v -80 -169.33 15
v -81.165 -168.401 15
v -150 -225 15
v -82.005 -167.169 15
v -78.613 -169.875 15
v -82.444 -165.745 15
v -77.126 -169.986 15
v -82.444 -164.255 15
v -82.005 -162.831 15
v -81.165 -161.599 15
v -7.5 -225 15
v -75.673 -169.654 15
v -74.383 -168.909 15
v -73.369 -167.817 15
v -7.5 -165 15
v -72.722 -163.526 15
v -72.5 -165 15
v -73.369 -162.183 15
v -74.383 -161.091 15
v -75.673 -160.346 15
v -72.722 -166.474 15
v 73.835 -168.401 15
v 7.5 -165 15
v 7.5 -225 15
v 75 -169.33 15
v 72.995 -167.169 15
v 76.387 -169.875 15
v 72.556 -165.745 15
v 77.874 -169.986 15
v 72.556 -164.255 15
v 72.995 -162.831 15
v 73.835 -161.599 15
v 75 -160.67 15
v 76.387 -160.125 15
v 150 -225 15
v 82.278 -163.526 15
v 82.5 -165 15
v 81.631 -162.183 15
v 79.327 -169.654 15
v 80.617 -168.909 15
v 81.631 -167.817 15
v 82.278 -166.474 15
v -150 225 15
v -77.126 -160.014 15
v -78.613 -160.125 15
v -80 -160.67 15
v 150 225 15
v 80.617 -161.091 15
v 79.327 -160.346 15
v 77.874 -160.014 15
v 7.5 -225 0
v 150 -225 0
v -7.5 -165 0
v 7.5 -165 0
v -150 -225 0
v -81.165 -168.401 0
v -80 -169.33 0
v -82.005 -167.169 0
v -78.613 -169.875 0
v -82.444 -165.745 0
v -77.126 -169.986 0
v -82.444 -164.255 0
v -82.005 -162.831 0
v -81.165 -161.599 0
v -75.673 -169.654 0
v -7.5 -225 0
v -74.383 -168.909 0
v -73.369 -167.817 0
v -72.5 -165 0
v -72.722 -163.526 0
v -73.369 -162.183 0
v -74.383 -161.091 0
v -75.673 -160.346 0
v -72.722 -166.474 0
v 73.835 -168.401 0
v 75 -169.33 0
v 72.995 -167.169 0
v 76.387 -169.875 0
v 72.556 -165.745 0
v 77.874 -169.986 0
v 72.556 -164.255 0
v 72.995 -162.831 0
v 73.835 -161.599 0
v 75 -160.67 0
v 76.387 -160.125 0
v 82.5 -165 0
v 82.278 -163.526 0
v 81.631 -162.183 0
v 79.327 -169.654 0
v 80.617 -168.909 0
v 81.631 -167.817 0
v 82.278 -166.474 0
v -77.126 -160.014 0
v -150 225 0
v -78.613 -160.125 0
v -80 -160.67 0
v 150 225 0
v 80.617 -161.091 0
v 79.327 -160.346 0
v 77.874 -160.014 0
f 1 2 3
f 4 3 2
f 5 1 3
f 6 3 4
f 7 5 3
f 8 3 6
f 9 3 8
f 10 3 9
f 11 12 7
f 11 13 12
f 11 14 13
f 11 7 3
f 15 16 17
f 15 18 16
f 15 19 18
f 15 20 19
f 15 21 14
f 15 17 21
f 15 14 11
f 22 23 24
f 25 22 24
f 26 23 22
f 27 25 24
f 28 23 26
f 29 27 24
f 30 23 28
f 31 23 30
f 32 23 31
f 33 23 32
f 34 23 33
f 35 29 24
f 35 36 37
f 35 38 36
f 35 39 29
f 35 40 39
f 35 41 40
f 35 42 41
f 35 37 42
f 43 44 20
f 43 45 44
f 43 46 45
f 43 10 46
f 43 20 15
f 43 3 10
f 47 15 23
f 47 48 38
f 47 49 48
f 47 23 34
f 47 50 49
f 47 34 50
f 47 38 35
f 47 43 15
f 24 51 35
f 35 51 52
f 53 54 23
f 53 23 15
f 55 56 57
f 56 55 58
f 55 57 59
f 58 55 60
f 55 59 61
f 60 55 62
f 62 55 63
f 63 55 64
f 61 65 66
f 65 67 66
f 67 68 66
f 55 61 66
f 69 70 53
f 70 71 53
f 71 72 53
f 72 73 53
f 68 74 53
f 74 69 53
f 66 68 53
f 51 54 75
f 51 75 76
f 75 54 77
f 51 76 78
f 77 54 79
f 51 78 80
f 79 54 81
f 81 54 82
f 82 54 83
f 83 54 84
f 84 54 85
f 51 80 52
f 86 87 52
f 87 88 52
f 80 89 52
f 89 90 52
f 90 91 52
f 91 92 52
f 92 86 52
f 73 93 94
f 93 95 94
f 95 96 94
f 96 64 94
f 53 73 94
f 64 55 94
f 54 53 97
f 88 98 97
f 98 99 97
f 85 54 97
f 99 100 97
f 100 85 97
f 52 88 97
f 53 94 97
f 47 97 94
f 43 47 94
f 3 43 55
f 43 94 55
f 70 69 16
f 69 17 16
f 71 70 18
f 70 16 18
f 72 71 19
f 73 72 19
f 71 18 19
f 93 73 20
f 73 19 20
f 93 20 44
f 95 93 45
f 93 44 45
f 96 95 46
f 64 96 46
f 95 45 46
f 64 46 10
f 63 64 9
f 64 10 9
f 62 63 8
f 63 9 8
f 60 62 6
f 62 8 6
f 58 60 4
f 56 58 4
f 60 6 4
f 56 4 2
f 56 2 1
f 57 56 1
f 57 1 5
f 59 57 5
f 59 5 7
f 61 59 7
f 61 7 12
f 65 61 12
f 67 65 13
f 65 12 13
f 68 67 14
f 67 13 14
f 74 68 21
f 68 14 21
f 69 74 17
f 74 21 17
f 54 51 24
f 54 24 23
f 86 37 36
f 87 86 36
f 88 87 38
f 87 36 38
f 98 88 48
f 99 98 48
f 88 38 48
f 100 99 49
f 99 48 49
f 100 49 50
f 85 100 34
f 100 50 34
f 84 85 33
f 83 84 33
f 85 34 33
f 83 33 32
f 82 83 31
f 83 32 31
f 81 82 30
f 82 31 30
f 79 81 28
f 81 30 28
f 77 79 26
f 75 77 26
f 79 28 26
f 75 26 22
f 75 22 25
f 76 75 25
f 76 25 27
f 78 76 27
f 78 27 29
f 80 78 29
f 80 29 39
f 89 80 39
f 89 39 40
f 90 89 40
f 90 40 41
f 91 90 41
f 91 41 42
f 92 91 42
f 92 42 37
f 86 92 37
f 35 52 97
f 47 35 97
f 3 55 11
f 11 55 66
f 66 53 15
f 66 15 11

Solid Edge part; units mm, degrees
sketch "Sketch1" plane through (0, 0, 0) normal (0, 0, 1) x (1, 0, 0)
  line L0 (-150, -225) -> (150, -225)
  line L1 (150, -225) -> (150, 225)
  line L2 (150, 225) -> (-150, 225)
  line L3 (-150, 225) -> (-150, -225)
extrude "Protrusion1" add sketch "Sketch1" along normal blind 15
sketch "Sketch2" plane through (0, 0, 15) normal (0, 0, 1) x (1, 0, 0)
  line L0 (-7.5, -285) -> (7.5, -285)
  line L1 (7.5, -285) -> (7.5, -165)
  line L2 (7.5, -165) -> (-7.5, -165)
  line L3 (-7.5, -165) -> (-7.5, -285)
extrude "ExtrudedCutout_1" cut sketch "Sketch2" along normal mid plane 124.4981
sketch "Sketch3" plane through (0, 0, 15) normal (0, 0, 1) x (1, 0, 0)
  circle A0 centre (77.5, -165) radius 5
  circle A1 centre (-77.5, -165) radius 5
  dimension "D1" = 70
  dimension "D2" = 70
extrude "ExtrudedCutout_2" cut sketch "Sketch3" along normal mid plane 524.4577
